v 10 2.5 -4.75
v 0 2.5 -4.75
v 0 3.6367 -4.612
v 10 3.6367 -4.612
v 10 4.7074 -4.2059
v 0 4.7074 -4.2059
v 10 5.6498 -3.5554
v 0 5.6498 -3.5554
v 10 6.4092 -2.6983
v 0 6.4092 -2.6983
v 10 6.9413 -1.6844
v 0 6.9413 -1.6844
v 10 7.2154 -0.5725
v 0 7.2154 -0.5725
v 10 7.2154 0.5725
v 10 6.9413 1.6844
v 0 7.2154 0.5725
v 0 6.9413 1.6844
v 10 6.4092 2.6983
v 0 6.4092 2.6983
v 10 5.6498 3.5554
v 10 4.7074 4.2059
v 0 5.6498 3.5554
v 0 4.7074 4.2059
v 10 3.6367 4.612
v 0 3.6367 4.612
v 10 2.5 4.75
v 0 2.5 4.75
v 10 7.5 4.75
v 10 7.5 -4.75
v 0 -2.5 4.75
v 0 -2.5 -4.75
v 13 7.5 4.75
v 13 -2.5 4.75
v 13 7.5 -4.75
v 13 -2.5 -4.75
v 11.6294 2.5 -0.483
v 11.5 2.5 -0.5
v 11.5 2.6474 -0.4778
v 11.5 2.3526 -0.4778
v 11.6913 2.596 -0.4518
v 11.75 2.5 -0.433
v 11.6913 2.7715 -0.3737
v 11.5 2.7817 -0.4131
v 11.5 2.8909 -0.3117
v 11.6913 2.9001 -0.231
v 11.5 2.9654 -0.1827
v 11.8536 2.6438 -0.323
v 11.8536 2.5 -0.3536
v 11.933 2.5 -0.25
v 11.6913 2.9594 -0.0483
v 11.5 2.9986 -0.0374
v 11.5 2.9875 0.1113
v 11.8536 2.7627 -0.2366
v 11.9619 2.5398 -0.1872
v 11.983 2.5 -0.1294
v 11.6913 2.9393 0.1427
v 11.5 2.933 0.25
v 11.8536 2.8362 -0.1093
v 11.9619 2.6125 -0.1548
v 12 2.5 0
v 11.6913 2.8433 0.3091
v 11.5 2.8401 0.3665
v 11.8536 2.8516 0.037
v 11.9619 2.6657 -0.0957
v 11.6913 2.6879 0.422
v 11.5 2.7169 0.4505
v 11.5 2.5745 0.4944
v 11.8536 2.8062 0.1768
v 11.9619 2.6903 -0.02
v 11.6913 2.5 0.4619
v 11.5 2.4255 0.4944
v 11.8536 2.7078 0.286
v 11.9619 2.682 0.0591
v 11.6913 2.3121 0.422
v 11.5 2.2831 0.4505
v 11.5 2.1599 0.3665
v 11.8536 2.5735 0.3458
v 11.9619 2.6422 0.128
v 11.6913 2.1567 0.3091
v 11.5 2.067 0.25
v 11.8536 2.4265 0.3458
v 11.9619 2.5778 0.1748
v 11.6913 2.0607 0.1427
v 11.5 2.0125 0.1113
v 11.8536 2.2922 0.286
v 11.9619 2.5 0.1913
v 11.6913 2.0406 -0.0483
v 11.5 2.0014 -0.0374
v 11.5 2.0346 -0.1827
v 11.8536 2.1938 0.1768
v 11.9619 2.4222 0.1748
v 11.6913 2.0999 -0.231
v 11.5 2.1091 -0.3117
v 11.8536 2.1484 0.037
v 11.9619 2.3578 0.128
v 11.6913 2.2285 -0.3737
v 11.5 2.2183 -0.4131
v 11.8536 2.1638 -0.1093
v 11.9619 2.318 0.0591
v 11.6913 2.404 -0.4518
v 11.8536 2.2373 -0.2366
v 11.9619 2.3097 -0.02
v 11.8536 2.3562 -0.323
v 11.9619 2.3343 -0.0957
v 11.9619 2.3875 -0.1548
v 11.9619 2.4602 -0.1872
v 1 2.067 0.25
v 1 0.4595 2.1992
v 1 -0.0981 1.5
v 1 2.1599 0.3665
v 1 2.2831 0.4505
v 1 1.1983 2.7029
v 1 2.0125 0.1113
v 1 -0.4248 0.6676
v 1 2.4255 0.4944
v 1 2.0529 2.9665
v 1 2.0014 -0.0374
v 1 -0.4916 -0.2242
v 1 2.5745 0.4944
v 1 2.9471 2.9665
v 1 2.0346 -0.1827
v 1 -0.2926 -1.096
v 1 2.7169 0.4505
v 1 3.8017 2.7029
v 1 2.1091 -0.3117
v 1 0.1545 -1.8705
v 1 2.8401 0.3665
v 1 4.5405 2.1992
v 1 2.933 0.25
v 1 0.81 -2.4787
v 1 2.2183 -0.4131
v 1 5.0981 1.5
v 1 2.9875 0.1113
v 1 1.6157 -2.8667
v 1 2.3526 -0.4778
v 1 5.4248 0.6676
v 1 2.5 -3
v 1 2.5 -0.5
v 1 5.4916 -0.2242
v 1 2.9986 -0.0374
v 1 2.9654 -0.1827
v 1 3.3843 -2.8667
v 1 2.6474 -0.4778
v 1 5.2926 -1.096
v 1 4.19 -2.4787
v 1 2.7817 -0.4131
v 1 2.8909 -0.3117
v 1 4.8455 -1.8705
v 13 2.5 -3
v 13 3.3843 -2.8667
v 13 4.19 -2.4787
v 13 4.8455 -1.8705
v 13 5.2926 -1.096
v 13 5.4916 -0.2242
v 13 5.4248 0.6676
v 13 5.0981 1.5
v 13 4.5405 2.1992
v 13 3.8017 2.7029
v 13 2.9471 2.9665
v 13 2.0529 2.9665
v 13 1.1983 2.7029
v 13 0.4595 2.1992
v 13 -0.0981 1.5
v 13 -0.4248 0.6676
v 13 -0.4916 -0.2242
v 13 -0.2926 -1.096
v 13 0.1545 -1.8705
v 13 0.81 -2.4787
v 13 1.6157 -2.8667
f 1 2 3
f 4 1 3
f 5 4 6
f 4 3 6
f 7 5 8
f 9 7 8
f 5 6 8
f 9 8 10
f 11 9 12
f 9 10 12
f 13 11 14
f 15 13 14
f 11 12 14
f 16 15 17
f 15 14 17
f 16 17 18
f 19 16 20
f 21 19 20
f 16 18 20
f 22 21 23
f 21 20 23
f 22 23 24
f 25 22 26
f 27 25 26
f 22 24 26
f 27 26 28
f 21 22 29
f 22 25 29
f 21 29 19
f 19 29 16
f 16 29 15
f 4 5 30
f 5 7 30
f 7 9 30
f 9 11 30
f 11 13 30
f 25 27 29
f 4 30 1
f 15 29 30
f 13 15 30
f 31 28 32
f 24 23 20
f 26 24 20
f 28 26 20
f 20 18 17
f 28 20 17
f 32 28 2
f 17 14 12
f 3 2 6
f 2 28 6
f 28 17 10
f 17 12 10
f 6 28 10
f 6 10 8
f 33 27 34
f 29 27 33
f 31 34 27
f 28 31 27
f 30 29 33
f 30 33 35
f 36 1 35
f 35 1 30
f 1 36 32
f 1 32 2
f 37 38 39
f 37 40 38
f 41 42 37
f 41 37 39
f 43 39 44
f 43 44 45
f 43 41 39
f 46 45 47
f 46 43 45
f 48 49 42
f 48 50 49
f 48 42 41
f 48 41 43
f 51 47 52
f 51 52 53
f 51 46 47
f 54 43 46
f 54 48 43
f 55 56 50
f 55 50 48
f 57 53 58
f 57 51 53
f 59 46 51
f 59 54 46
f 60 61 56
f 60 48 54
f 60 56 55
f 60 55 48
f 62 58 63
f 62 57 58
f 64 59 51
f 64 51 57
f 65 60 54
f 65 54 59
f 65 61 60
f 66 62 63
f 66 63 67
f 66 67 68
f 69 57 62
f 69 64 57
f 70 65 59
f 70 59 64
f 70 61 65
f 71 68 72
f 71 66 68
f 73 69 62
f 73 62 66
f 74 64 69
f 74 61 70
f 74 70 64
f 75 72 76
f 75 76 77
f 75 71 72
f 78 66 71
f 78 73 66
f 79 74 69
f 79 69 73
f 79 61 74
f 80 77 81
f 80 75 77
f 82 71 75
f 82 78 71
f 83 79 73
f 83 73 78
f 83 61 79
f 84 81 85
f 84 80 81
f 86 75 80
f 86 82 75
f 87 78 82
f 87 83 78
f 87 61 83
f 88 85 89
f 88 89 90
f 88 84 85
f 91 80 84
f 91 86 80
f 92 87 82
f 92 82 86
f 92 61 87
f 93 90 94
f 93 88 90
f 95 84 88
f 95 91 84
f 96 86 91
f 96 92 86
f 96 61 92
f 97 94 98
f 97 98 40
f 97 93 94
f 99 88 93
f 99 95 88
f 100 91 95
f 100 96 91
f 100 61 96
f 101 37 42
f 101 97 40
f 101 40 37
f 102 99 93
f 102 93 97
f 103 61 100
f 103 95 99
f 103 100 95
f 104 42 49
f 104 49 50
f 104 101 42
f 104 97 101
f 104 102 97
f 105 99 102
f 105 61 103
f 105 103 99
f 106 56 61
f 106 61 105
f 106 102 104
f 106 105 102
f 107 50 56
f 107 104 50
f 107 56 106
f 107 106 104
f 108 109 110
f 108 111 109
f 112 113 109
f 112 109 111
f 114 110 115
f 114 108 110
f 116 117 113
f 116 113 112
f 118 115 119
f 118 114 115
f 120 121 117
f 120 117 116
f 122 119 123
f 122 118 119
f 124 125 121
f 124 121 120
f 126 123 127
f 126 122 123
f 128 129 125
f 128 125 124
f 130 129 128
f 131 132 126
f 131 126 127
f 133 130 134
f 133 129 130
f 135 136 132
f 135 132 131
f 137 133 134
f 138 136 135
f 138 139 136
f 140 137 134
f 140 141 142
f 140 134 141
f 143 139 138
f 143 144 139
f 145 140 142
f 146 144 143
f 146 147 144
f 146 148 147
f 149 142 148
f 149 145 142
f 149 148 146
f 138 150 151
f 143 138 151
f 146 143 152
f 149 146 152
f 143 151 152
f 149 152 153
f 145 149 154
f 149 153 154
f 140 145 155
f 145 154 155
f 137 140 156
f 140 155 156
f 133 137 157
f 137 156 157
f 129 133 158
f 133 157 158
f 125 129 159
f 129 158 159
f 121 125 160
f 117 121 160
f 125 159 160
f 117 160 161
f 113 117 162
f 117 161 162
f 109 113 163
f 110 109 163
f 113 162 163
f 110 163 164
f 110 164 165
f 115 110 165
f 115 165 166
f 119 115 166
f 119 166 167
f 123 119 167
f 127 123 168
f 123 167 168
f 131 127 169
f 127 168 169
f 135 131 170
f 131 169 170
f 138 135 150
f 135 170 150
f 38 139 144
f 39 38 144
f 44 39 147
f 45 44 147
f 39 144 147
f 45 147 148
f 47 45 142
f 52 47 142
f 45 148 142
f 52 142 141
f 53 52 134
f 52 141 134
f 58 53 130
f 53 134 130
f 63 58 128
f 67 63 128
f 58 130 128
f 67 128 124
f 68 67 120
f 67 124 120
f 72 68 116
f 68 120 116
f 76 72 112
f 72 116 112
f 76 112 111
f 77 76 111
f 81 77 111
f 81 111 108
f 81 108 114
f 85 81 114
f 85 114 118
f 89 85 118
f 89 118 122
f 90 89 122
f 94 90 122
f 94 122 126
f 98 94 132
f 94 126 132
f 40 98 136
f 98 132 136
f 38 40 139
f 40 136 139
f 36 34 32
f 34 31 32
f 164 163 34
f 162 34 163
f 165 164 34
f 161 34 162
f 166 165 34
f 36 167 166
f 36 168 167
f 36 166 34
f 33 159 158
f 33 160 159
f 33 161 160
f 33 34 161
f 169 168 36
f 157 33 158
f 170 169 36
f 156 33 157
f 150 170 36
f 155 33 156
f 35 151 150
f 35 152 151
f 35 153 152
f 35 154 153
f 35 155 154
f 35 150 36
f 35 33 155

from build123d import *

# Parameters (mm, degrees)
BOSS_EXTRUDE1_DEPTH = 10
SKETCH2_W           = 9.5
SKETCH2_H           = 10
BOSS_EXTRUDE2_DEPTH = 3
SKETCH3_R           = 3
CUT_EXTRUDE1_DEPTH  = 12
SKETCH4_R           = 0.5
BOSS_EXTRUDE3_DEPTH = 11
FILLET1_R           = 0.5


with BuildPart() as part:
    # Sketch1 → Boss-Extrude1 (new body)
    with BuildSketch(Plane(origin=(0, 0, 0), x_dir=(0, 0, -1), z_dir=(1, 0, 0))):
        with BuildLine():
            Line((-4.75, -2.5), (4.75, -2.5))
            Line((4.75, -2.5), (4.75, 2.5))
            ThreePointArc((4.75, 2.5), (0, 7.25), (-4.75, 2.5))
            Line((-4.75, 2.5), (-4.75, -2.5))
        make_face()
    extrude(amount=BOSS_EXTRUDE1_DEPTH)

    # Sketch2 → Boss-Extrude2 (add)
    with BuildSketch(Plane(origin=(10, 0, 0), x_dir=(0, 0, -1), z_dir=(1, 0, 0))):
        with Locations((0, 2.5)):
            Rectangle(SKETCH2_W, SKETCH2_H)
    extrude(amount=BOSS_EXTRUDE2_DEPTH)

    # Sketch3 → Cut-Extrude1 (cut)
    with BuildSketch(Plane(origin=(13, 0, 0), x_dir=(0, 0, -1), z_dir=(1, 0, 0))):
        with Locations((0, 2.5)):
            Circle(SKETCH3_R)
    extrude(amount=-CUT_EXTRUDE1_DEPTH, mode=Mode.SUBTRACT)

    # Sketch4 → Boss-Extrude3 (add)
    with BuildSketch(Plane(origin=(1, 0, 0), x_dir=(0, 0, -1), z_dir=(1, 0, 0))):
        with Locations((0, 2.5)):
            Circle(SKETCH4_R)
    extrude(amount=BOSS_EXTRUDE3_DEPTH)

    # Fillet1
    fillet1_edges = [part.edges().sort_by_distance(p)[0] for p in [
        (12, 2.5, 0.5),
    ]]
    fillet(fillet1_edges, radius=FILLET1_R)


solid = part.part
